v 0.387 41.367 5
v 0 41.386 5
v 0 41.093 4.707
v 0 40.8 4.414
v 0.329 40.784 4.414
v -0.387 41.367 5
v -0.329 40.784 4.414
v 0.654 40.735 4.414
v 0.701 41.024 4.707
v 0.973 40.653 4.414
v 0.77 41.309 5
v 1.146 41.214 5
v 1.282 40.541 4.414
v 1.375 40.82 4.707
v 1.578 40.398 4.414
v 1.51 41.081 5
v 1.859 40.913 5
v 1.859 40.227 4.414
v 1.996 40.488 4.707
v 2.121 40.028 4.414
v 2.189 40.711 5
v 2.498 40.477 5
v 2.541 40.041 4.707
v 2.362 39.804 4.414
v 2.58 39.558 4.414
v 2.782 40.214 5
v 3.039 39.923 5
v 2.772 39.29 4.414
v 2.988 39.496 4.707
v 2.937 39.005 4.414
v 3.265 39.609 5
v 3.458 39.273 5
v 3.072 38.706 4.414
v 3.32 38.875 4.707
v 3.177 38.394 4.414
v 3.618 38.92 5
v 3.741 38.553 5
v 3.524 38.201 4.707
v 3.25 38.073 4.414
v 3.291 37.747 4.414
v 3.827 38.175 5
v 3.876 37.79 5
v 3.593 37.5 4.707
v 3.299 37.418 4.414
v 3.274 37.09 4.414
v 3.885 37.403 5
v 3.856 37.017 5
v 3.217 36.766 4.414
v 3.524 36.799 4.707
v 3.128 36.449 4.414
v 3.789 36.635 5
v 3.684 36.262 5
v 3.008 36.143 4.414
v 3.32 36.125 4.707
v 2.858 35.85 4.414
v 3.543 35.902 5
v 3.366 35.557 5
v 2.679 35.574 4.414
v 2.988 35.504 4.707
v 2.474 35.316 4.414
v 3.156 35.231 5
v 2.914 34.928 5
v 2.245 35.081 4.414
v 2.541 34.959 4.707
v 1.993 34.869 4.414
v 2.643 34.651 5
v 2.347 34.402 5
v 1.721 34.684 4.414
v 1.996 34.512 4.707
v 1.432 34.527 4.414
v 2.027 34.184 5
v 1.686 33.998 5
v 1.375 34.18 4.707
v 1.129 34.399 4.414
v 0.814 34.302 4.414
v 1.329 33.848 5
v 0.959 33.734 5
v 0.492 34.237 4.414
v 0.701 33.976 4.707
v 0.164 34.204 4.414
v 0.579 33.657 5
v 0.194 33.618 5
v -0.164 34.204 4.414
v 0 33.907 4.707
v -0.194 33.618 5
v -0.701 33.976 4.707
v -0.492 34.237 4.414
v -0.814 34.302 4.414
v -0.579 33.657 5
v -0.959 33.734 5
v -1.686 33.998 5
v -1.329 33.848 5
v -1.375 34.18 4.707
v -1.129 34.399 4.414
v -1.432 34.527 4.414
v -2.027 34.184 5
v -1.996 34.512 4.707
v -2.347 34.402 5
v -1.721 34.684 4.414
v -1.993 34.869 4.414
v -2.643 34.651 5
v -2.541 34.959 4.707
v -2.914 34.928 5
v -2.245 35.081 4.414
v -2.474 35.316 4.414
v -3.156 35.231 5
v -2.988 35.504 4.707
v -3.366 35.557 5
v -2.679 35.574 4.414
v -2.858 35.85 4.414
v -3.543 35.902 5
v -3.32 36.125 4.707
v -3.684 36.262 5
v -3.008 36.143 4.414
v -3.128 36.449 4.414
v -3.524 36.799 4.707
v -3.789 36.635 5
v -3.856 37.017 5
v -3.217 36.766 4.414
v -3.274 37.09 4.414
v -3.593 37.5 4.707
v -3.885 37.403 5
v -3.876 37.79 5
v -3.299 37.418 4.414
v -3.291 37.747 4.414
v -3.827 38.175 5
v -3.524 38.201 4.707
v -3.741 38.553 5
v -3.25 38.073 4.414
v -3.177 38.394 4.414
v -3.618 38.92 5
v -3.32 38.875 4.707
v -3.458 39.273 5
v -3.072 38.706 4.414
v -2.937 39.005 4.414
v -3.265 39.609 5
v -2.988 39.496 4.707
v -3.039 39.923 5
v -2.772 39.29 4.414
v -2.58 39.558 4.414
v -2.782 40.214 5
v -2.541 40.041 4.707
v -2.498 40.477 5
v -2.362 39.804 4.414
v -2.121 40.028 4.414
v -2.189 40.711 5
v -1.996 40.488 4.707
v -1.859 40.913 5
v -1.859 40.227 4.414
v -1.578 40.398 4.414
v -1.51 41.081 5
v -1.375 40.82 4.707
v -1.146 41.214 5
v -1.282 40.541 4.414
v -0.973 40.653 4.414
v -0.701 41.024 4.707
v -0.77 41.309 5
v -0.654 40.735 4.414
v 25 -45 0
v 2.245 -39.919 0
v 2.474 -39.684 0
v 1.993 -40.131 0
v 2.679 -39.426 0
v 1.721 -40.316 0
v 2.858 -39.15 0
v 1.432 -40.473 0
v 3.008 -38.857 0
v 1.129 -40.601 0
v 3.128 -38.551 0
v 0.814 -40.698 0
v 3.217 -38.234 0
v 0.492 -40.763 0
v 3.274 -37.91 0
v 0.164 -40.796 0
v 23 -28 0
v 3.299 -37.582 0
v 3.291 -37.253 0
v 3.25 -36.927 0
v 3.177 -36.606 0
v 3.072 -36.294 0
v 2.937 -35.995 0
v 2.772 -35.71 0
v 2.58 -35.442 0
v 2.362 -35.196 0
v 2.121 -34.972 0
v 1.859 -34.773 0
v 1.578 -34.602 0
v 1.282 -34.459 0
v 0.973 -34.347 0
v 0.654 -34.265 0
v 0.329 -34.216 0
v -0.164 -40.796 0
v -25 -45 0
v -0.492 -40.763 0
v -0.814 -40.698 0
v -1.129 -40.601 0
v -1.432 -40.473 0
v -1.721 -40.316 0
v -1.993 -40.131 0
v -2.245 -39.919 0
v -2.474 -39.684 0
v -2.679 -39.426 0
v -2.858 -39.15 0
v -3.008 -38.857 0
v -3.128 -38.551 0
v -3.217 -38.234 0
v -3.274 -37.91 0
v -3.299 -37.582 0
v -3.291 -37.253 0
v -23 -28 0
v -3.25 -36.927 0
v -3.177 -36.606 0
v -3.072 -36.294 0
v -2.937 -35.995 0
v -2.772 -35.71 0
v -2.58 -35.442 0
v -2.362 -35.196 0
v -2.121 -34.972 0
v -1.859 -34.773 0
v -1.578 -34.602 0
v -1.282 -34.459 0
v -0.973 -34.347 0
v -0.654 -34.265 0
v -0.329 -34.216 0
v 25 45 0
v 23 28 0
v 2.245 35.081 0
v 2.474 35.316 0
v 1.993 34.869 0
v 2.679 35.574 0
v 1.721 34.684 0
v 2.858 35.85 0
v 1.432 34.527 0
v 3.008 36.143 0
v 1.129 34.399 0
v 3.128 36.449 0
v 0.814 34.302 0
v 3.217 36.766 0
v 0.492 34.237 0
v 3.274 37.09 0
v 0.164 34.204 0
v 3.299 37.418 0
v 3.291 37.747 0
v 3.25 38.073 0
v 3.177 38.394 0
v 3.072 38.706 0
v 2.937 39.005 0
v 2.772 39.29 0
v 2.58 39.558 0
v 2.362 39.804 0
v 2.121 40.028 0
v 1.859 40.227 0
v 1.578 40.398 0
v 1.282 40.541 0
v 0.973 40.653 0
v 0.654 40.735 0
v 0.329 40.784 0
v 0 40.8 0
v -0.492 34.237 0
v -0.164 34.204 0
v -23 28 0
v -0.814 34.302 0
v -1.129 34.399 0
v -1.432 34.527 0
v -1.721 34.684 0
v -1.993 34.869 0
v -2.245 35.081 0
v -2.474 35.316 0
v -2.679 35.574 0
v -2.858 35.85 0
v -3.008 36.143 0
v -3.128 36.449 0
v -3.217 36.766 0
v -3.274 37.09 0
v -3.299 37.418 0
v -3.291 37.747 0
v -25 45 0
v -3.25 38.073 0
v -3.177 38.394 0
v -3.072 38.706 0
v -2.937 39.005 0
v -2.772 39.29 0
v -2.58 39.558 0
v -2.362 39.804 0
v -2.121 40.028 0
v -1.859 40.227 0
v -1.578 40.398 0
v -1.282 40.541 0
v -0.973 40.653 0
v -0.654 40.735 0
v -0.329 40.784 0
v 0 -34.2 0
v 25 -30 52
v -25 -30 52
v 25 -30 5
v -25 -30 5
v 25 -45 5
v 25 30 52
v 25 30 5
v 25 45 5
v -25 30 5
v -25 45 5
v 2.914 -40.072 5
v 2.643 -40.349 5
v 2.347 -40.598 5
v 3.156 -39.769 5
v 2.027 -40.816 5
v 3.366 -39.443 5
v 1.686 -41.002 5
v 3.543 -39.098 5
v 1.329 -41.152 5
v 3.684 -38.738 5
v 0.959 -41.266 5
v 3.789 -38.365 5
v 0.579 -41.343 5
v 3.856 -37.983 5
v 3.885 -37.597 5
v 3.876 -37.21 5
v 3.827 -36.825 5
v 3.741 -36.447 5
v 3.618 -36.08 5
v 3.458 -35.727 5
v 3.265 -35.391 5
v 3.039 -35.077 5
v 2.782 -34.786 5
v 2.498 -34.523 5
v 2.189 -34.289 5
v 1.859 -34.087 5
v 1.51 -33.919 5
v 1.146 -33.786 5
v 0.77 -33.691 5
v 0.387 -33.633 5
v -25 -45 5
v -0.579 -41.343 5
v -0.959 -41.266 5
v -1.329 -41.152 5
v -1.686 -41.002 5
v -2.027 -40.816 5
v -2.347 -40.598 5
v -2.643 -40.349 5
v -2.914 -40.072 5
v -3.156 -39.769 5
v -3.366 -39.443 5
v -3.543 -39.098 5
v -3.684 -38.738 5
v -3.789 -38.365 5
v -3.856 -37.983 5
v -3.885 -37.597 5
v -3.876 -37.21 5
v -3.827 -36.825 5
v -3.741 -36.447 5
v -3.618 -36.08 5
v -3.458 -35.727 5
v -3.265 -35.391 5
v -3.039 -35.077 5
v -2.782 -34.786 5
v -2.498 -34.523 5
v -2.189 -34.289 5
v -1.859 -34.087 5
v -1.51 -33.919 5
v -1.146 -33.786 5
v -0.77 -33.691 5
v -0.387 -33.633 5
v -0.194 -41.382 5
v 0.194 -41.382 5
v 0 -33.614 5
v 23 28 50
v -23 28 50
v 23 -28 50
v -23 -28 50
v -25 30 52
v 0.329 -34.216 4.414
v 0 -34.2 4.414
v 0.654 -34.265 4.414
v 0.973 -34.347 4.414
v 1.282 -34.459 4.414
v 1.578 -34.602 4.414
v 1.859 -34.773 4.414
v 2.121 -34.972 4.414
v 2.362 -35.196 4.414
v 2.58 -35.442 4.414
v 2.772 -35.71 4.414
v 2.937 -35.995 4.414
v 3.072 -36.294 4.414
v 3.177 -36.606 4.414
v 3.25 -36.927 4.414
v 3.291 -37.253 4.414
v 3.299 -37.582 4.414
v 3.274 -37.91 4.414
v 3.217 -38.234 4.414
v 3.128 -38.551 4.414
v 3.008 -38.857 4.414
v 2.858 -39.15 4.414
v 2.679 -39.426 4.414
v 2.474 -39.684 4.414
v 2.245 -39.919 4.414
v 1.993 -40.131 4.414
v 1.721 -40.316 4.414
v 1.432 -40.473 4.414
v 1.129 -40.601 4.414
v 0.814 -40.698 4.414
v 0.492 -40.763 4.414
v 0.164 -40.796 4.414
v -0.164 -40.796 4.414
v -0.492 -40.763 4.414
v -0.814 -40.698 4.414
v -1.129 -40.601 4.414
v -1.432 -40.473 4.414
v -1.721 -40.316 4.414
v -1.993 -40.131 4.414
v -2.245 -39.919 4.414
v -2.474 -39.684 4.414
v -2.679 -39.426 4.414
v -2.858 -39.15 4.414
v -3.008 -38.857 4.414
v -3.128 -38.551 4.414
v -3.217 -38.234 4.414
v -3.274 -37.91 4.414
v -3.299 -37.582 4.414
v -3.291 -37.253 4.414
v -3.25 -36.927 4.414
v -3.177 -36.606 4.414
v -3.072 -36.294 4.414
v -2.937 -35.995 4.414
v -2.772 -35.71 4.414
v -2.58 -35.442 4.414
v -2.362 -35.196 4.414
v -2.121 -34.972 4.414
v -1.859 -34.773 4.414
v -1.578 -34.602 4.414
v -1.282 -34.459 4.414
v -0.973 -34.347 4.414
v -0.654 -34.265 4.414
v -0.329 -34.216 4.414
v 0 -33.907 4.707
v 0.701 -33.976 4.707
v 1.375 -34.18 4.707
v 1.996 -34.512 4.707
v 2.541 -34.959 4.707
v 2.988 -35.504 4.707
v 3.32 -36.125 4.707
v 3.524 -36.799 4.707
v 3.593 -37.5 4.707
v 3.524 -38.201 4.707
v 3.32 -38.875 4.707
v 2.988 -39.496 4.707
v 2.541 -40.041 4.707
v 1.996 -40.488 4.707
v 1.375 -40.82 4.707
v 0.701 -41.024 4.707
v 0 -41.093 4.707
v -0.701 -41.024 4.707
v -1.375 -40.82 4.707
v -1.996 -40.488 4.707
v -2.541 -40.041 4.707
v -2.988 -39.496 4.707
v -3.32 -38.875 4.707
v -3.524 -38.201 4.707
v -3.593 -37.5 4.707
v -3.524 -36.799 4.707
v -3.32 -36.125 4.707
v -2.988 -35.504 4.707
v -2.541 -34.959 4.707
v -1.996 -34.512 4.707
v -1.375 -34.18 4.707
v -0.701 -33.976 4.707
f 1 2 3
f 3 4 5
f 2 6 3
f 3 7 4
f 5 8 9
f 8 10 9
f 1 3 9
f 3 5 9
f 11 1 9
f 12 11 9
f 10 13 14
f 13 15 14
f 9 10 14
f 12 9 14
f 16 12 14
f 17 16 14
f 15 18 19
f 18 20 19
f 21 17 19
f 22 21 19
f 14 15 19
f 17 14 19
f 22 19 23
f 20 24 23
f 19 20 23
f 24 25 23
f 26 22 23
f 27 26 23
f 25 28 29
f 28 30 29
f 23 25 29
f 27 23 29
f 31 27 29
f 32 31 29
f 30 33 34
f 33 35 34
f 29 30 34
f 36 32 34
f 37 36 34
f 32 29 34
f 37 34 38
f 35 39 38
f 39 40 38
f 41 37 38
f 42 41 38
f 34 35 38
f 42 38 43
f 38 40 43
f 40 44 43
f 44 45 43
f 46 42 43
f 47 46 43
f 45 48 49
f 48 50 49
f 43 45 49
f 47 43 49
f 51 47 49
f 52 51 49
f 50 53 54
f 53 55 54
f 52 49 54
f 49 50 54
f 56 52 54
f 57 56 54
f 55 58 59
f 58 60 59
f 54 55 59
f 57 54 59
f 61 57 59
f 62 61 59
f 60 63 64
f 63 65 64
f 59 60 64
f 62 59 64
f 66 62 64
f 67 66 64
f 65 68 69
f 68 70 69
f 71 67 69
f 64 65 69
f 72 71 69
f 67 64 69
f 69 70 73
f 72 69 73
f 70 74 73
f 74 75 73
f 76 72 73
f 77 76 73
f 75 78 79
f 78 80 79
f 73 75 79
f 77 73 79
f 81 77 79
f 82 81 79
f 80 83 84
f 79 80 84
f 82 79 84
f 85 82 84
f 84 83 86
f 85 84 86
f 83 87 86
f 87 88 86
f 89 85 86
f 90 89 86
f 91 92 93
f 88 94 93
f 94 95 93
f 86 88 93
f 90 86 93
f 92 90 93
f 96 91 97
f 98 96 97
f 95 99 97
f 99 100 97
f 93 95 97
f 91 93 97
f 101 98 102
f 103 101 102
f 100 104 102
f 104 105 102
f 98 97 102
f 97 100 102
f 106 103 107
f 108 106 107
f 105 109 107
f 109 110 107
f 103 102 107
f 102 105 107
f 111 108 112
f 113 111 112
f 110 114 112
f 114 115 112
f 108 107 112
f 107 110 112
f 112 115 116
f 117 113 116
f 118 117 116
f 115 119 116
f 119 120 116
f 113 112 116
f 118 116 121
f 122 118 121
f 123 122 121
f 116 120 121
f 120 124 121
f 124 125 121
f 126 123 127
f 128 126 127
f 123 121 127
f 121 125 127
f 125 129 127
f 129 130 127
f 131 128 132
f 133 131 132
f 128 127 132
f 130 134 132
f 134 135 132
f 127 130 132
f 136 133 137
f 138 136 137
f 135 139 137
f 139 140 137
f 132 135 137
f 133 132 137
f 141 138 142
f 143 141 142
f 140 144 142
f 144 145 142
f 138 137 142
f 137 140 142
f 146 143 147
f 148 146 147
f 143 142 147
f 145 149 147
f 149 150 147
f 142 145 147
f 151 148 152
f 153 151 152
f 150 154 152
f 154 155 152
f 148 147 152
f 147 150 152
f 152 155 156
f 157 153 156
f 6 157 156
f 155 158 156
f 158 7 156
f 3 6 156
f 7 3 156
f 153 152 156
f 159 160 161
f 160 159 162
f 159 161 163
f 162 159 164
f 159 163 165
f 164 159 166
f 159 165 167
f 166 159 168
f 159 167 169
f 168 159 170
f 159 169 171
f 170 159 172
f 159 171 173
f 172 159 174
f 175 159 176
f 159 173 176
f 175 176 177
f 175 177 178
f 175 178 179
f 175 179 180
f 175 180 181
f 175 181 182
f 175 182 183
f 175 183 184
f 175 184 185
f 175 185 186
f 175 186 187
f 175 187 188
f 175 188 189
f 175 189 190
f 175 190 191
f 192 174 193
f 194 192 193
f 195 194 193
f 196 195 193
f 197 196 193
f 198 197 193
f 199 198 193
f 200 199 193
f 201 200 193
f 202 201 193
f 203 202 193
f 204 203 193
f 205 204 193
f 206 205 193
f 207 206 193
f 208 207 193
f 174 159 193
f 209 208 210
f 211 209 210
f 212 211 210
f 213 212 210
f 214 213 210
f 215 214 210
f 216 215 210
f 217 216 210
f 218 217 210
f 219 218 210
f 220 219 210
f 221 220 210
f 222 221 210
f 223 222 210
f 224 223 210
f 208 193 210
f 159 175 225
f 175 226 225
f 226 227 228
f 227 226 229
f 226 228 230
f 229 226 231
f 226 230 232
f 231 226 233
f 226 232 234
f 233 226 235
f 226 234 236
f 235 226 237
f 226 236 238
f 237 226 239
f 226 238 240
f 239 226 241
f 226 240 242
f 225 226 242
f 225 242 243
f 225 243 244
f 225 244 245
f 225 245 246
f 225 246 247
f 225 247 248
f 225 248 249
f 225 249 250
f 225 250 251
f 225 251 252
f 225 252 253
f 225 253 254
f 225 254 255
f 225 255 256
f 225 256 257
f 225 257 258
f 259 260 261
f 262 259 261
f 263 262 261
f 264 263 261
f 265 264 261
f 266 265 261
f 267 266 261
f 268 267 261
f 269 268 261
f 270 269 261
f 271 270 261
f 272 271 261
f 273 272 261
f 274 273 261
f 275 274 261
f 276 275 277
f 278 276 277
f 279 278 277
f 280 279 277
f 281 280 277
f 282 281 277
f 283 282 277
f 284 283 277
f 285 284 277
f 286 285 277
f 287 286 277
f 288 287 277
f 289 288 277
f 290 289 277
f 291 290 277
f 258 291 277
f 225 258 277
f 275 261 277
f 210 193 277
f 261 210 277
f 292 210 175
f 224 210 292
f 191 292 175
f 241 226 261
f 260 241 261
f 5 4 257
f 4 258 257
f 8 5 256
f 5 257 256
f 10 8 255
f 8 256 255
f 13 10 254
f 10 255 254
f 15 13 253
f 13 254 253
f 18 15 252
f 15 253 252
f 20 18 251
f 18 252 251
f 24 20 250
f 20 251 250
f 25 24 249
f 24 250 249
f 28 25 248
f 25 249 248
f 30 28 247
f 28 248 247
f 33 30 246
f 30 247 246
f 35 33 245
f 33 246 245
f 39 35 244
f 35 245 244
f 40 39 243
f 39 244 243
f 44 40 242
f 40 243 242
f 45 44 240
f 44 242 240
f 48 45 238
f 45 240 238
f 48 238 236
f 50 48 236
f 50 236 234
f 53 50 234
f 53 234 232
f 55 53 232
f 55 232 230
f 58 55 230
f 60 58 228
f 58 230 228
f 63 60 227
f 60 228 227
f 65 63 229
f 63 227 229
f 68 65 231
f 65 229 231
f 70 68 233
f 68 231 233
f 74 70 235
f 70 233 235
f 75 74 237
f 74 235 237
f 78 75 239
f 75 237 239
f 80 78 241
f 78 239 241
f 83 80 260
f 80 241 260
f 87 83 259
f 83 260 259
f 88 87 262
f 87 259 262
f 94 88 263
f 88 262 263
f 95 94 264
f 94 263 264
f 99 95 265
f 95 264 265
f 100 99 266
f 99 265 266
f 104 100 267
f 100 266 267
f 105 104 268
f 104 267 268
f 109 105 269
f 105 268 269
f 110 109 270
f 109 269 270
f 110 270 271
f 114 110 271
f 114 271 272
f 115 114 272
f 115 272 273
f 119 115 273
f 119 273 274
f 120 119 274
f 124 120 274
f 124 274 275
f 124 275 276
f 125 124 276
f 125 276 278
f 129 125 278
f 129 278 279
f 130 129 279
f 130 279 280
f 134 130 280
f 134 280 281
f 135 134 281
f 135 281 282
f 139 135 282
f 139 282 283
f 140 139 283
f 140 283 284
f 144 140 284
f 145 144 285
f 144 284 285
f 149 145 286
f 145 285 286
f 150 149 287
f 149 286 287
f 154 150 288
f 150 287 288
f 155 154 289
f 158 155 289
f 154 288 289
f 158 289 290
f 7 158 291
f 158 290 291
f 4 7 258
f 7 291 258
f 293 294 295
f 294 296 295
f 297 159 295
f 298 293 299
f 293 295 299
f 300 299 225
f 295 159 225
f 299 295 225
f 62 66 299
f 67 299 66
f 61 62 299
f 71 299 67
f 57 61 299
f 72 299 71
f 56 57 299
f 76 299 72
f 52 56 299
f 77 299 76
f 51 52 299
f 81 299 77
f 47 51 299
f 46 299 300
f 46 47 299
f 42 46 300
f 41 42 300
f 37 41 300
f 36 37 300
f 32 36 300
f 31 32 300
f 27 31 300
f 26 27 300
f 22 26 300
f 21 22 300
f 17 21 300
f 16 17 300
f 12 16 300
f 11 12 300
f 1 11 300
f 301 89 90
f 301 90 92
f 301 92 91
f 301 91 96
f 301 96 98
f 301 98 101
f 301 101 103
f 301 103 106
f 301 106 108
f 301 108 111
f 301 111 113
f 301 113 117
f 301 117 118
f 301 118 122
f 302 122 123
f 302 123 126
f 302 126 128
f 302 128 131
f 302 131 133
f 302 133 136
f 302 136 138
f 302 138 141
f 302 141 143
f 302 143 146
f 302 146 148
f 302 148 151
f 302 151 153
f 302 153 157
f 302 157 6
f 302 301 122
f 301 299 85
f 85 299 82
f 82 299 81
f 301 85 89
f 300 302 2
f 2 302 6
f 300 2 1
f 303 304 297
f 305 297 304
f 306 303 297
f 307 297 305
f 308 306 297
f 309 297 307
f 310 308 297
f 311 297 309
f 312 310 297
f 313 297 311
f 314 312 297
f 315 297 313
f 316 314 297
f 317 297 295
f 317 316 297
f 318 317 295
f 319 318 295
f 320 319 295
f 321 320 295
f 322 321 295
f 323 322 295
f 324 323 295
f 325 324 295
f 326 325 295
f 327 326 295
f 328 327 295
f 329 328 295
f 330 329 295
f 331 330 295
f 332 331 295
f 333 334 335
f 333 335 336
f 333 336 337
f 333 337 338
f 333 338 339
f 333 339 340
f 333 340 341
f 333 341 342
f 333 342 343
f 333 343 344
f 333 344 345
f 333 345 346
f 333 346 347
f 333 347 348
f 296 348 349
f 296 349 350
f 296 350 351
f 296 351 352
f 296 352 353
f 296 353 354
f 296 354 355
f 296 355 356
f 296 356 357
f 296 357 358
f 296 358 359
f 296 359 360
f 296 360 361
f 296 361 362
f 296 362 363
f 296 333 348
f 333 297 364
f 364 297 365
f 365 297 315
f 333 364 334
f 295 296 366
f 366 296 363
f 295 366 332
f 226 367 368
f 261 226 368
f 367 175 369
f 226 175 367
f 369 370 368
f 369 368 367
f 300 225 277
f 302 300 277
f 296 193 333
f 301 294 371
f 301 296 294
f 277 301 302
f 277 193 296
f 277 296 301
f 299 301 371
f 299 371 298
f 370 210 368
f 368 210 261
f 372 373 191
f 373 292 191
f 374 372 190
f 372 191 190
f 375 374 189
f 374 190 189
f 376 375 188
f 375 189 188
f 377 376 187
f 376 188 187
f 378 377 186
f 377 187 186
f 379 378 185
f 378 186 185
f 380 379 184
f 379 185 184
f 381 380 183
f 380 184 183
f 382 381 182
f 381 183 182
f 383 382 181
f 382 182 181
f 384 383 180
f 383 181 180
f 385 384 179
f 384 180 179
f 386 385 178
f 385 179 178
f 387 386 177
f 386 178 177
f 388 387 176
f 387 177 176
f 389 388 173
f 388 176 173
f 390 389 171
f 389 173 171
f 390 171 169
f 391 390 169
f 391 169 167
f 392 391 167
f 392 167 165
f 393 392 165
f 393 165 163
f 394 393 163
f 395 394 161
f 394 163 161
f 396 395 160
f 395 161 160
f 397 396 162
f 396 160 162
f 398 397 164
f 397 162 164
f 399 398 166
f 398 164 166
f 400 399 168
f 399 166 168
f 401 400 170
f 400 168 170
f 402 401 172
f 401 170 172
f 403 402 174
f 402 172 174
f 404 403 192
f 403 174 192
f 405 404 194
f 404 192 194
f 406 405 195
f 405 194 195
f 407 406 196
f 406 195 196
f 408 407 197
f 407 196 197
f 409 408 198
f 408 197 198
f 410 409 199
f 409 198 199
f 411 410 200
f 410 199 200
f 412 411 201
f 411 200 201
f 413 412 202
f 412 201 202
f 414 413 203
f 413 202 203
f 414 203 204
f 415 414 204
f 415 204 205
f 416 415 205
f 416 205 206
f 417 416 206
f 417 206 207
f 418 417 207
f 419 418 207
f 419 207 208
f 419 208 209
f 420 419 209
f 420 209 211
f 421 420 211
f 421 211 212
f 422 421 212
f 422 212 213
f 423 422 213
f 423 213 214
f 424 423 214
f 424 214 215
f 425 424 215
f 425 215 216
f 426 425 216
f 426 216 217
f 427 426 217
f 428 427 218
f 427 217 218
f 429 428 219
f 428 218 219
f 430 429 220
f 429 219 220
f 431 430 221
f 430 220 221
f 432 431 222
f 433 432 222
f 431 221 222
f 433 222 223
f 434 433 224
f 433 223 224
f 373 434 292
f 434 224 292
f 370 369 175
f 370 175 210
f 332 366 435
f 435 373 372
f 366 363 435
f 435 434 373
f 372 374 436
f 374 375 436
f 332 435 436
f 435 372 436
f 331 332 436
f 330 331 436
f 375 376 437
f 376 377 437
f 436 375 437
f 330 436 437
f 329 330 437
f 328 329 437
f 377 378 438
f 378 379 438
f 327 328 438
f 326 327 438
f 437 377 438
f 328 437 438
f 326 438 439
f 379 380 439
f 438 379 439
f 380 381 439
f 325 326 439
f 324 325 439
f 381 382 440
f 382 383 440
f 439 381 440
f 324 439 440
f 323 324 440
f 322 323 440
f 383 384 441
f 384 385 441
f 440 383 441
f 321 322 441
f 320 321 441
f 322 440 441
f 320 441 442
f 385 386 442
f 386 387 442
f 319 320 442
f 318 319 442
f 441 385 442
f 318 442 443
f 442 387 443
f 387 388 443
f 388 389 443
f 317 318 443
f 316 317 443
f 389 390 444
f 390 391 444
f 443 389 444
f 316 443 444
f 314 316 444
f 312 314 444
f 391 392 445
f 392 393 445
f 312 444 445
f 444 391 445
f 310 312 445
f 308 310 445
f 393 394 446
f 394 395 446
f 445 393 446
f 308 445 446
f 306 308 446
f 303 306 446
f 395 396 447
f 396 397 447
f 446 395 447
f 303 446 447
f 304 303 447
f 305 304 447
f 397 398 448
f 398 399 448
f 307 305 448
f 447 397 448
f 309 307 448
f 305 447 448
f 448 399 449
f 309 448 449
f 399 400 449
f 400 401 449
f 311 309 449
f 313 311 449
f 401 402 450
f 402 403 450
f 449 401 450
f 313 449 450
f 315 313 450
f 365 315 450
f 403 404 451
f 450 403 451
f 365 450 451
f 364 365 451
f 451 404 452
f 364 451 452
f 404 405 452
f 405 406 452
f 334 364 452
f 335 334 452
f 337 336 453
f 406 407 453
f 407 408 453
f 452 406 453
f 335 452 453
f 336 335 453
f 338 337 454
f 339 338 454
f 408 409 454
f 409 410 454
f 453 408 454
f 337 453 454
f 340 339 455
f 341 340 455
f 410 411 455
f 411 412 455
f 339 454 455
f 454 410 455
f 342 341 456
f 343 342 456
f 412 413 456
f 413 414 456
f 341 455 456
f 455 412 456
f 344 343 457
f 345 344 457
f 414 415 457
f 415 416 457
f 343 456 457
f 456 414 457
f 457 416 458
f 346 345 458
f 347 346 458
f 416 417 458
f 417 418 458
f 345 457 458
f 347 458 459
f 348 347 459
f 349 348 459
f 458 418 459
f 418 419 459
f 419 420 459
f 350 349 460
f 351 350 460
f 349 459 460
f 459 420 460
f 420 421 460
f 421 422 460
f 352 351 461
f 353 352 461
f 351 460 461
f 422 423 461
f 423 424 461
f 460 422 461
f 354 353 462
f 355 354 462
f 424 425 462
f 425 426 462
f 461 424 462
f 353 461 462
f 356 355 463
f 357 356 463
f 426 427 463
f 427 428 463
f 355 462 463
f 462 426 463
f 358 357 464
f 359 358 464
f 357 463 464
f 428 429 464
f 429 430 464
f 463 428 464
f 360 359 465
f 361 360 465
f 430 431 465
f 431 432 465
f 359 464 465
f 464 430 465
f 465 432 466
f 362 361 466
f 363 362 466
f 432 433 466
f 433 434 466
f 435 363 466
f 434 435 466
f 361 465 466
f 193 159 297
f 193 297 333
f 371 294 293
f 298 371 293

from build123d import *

# Parameters (mm, degrees)
ESBO_O1_W                          = 15
ESBO_O1_H                          = 50
RESSALTO_EXTRUS_O1_DEPTH           = 5
RESSALTO_EXTRUS_O1_2_DEPTH         = 5
ESBO_O1_4_W                        = 60
ESBO_O1_4_H                        = 50
ESBO_O1_4_W_2                      = 56
ESBO_O1_4_H_2                      = 46
RESSALTO_EXTRUS_O2_DEPTH           = 50
ESBO_O3_W                          = 50
ESBO_O3_H                          = 60
RESSALTO_EXTRUS_O3_DEPTH           = 2
FURO_ROSCADO_DE_G1_164_D           = 6.6
FURO_ROSCADO_DE_G1_164_CSINK_D     = 7.773
FURO_ROSCADO_DE_G1_164_CSINK_ANGLE = 90


with BuildPart() as part:
    # Esboço1 → Ressalto-extrusão1 (new body)
    with BuildSketch(Plane(origin=(0, 0, 0), x_dir=(0, 1, 0), z_dir=(0, 0, 1))):
        with Locations((37.5, 0)):
            Rectangle(ESBO_O1_W, ESBO_O1_H)
    extrude(amount=RESSALTO_EXTRUS_O1_DEPTH)



with BuildPart() as body_2:
    # Esboço1 → Ressalto-extrus_o1 2 (new body)
    with BuildSketch(Plane(origin=(0, 0, 0), x_dir=(0, 1, 0), z_dir=(0, 0, 1))):
        with Locations((-37.5, 0)):
            Rectangle(ESBO_O1_W, ESBO_O1_H)
    extrude(amount=RESSALTO_EXTRUS_O1_2_DEPTH)


with BuildPart() as part_1:
    add(part.part)

    add(body_2.part)  # Ressalto-extrusão2 merges body 2
    # Esboço1<4> → Ressalto-extrusão2 (add)
    with BuildSketch(Plane(origin=(0, 0, 0), x_dir=(0, 1, 0), z_dir=(0, 0, 1))):
        Rectangle(ESBO_O1_4_W, ESBO_O1_4_H)
        Rectangle(ESBO_O1_4_W_2, ESBO_O1_4_H_2, mode=Mode.SUBTRACT)
    extrude(amount=RESSALTO_EXTRUS_O2_DEPTH)

    # Esboço3 → Ressalto-extrusão3 (add)
    with BuildSketch(Plane.XY.offset(50)):
        Rectangle(ESBO_O3_W, ESBO_O3_H)
    extrude(amount=RESSALTO_EXTRUS_O3_DEPTH)

    # Furo roscado de G1/164 (through all)
    with Locations(Plane(origin=(0, 0, 5), x_dir=(0, -1, 0), z_dir=(0, 0, 1))):
        with Locations((37.5, 0), (-37.5, 0)):
            CounterSinkHole(FURO_ROSCADO_DE_G1_164_D / 2, FURO_ROSCADO_DE_G1_164_CSINK_D / 2, counter_sink_angle=FURO_ROSCADO_DE_G1_164_CSINK_ANGLE)


solid = part_1.part
